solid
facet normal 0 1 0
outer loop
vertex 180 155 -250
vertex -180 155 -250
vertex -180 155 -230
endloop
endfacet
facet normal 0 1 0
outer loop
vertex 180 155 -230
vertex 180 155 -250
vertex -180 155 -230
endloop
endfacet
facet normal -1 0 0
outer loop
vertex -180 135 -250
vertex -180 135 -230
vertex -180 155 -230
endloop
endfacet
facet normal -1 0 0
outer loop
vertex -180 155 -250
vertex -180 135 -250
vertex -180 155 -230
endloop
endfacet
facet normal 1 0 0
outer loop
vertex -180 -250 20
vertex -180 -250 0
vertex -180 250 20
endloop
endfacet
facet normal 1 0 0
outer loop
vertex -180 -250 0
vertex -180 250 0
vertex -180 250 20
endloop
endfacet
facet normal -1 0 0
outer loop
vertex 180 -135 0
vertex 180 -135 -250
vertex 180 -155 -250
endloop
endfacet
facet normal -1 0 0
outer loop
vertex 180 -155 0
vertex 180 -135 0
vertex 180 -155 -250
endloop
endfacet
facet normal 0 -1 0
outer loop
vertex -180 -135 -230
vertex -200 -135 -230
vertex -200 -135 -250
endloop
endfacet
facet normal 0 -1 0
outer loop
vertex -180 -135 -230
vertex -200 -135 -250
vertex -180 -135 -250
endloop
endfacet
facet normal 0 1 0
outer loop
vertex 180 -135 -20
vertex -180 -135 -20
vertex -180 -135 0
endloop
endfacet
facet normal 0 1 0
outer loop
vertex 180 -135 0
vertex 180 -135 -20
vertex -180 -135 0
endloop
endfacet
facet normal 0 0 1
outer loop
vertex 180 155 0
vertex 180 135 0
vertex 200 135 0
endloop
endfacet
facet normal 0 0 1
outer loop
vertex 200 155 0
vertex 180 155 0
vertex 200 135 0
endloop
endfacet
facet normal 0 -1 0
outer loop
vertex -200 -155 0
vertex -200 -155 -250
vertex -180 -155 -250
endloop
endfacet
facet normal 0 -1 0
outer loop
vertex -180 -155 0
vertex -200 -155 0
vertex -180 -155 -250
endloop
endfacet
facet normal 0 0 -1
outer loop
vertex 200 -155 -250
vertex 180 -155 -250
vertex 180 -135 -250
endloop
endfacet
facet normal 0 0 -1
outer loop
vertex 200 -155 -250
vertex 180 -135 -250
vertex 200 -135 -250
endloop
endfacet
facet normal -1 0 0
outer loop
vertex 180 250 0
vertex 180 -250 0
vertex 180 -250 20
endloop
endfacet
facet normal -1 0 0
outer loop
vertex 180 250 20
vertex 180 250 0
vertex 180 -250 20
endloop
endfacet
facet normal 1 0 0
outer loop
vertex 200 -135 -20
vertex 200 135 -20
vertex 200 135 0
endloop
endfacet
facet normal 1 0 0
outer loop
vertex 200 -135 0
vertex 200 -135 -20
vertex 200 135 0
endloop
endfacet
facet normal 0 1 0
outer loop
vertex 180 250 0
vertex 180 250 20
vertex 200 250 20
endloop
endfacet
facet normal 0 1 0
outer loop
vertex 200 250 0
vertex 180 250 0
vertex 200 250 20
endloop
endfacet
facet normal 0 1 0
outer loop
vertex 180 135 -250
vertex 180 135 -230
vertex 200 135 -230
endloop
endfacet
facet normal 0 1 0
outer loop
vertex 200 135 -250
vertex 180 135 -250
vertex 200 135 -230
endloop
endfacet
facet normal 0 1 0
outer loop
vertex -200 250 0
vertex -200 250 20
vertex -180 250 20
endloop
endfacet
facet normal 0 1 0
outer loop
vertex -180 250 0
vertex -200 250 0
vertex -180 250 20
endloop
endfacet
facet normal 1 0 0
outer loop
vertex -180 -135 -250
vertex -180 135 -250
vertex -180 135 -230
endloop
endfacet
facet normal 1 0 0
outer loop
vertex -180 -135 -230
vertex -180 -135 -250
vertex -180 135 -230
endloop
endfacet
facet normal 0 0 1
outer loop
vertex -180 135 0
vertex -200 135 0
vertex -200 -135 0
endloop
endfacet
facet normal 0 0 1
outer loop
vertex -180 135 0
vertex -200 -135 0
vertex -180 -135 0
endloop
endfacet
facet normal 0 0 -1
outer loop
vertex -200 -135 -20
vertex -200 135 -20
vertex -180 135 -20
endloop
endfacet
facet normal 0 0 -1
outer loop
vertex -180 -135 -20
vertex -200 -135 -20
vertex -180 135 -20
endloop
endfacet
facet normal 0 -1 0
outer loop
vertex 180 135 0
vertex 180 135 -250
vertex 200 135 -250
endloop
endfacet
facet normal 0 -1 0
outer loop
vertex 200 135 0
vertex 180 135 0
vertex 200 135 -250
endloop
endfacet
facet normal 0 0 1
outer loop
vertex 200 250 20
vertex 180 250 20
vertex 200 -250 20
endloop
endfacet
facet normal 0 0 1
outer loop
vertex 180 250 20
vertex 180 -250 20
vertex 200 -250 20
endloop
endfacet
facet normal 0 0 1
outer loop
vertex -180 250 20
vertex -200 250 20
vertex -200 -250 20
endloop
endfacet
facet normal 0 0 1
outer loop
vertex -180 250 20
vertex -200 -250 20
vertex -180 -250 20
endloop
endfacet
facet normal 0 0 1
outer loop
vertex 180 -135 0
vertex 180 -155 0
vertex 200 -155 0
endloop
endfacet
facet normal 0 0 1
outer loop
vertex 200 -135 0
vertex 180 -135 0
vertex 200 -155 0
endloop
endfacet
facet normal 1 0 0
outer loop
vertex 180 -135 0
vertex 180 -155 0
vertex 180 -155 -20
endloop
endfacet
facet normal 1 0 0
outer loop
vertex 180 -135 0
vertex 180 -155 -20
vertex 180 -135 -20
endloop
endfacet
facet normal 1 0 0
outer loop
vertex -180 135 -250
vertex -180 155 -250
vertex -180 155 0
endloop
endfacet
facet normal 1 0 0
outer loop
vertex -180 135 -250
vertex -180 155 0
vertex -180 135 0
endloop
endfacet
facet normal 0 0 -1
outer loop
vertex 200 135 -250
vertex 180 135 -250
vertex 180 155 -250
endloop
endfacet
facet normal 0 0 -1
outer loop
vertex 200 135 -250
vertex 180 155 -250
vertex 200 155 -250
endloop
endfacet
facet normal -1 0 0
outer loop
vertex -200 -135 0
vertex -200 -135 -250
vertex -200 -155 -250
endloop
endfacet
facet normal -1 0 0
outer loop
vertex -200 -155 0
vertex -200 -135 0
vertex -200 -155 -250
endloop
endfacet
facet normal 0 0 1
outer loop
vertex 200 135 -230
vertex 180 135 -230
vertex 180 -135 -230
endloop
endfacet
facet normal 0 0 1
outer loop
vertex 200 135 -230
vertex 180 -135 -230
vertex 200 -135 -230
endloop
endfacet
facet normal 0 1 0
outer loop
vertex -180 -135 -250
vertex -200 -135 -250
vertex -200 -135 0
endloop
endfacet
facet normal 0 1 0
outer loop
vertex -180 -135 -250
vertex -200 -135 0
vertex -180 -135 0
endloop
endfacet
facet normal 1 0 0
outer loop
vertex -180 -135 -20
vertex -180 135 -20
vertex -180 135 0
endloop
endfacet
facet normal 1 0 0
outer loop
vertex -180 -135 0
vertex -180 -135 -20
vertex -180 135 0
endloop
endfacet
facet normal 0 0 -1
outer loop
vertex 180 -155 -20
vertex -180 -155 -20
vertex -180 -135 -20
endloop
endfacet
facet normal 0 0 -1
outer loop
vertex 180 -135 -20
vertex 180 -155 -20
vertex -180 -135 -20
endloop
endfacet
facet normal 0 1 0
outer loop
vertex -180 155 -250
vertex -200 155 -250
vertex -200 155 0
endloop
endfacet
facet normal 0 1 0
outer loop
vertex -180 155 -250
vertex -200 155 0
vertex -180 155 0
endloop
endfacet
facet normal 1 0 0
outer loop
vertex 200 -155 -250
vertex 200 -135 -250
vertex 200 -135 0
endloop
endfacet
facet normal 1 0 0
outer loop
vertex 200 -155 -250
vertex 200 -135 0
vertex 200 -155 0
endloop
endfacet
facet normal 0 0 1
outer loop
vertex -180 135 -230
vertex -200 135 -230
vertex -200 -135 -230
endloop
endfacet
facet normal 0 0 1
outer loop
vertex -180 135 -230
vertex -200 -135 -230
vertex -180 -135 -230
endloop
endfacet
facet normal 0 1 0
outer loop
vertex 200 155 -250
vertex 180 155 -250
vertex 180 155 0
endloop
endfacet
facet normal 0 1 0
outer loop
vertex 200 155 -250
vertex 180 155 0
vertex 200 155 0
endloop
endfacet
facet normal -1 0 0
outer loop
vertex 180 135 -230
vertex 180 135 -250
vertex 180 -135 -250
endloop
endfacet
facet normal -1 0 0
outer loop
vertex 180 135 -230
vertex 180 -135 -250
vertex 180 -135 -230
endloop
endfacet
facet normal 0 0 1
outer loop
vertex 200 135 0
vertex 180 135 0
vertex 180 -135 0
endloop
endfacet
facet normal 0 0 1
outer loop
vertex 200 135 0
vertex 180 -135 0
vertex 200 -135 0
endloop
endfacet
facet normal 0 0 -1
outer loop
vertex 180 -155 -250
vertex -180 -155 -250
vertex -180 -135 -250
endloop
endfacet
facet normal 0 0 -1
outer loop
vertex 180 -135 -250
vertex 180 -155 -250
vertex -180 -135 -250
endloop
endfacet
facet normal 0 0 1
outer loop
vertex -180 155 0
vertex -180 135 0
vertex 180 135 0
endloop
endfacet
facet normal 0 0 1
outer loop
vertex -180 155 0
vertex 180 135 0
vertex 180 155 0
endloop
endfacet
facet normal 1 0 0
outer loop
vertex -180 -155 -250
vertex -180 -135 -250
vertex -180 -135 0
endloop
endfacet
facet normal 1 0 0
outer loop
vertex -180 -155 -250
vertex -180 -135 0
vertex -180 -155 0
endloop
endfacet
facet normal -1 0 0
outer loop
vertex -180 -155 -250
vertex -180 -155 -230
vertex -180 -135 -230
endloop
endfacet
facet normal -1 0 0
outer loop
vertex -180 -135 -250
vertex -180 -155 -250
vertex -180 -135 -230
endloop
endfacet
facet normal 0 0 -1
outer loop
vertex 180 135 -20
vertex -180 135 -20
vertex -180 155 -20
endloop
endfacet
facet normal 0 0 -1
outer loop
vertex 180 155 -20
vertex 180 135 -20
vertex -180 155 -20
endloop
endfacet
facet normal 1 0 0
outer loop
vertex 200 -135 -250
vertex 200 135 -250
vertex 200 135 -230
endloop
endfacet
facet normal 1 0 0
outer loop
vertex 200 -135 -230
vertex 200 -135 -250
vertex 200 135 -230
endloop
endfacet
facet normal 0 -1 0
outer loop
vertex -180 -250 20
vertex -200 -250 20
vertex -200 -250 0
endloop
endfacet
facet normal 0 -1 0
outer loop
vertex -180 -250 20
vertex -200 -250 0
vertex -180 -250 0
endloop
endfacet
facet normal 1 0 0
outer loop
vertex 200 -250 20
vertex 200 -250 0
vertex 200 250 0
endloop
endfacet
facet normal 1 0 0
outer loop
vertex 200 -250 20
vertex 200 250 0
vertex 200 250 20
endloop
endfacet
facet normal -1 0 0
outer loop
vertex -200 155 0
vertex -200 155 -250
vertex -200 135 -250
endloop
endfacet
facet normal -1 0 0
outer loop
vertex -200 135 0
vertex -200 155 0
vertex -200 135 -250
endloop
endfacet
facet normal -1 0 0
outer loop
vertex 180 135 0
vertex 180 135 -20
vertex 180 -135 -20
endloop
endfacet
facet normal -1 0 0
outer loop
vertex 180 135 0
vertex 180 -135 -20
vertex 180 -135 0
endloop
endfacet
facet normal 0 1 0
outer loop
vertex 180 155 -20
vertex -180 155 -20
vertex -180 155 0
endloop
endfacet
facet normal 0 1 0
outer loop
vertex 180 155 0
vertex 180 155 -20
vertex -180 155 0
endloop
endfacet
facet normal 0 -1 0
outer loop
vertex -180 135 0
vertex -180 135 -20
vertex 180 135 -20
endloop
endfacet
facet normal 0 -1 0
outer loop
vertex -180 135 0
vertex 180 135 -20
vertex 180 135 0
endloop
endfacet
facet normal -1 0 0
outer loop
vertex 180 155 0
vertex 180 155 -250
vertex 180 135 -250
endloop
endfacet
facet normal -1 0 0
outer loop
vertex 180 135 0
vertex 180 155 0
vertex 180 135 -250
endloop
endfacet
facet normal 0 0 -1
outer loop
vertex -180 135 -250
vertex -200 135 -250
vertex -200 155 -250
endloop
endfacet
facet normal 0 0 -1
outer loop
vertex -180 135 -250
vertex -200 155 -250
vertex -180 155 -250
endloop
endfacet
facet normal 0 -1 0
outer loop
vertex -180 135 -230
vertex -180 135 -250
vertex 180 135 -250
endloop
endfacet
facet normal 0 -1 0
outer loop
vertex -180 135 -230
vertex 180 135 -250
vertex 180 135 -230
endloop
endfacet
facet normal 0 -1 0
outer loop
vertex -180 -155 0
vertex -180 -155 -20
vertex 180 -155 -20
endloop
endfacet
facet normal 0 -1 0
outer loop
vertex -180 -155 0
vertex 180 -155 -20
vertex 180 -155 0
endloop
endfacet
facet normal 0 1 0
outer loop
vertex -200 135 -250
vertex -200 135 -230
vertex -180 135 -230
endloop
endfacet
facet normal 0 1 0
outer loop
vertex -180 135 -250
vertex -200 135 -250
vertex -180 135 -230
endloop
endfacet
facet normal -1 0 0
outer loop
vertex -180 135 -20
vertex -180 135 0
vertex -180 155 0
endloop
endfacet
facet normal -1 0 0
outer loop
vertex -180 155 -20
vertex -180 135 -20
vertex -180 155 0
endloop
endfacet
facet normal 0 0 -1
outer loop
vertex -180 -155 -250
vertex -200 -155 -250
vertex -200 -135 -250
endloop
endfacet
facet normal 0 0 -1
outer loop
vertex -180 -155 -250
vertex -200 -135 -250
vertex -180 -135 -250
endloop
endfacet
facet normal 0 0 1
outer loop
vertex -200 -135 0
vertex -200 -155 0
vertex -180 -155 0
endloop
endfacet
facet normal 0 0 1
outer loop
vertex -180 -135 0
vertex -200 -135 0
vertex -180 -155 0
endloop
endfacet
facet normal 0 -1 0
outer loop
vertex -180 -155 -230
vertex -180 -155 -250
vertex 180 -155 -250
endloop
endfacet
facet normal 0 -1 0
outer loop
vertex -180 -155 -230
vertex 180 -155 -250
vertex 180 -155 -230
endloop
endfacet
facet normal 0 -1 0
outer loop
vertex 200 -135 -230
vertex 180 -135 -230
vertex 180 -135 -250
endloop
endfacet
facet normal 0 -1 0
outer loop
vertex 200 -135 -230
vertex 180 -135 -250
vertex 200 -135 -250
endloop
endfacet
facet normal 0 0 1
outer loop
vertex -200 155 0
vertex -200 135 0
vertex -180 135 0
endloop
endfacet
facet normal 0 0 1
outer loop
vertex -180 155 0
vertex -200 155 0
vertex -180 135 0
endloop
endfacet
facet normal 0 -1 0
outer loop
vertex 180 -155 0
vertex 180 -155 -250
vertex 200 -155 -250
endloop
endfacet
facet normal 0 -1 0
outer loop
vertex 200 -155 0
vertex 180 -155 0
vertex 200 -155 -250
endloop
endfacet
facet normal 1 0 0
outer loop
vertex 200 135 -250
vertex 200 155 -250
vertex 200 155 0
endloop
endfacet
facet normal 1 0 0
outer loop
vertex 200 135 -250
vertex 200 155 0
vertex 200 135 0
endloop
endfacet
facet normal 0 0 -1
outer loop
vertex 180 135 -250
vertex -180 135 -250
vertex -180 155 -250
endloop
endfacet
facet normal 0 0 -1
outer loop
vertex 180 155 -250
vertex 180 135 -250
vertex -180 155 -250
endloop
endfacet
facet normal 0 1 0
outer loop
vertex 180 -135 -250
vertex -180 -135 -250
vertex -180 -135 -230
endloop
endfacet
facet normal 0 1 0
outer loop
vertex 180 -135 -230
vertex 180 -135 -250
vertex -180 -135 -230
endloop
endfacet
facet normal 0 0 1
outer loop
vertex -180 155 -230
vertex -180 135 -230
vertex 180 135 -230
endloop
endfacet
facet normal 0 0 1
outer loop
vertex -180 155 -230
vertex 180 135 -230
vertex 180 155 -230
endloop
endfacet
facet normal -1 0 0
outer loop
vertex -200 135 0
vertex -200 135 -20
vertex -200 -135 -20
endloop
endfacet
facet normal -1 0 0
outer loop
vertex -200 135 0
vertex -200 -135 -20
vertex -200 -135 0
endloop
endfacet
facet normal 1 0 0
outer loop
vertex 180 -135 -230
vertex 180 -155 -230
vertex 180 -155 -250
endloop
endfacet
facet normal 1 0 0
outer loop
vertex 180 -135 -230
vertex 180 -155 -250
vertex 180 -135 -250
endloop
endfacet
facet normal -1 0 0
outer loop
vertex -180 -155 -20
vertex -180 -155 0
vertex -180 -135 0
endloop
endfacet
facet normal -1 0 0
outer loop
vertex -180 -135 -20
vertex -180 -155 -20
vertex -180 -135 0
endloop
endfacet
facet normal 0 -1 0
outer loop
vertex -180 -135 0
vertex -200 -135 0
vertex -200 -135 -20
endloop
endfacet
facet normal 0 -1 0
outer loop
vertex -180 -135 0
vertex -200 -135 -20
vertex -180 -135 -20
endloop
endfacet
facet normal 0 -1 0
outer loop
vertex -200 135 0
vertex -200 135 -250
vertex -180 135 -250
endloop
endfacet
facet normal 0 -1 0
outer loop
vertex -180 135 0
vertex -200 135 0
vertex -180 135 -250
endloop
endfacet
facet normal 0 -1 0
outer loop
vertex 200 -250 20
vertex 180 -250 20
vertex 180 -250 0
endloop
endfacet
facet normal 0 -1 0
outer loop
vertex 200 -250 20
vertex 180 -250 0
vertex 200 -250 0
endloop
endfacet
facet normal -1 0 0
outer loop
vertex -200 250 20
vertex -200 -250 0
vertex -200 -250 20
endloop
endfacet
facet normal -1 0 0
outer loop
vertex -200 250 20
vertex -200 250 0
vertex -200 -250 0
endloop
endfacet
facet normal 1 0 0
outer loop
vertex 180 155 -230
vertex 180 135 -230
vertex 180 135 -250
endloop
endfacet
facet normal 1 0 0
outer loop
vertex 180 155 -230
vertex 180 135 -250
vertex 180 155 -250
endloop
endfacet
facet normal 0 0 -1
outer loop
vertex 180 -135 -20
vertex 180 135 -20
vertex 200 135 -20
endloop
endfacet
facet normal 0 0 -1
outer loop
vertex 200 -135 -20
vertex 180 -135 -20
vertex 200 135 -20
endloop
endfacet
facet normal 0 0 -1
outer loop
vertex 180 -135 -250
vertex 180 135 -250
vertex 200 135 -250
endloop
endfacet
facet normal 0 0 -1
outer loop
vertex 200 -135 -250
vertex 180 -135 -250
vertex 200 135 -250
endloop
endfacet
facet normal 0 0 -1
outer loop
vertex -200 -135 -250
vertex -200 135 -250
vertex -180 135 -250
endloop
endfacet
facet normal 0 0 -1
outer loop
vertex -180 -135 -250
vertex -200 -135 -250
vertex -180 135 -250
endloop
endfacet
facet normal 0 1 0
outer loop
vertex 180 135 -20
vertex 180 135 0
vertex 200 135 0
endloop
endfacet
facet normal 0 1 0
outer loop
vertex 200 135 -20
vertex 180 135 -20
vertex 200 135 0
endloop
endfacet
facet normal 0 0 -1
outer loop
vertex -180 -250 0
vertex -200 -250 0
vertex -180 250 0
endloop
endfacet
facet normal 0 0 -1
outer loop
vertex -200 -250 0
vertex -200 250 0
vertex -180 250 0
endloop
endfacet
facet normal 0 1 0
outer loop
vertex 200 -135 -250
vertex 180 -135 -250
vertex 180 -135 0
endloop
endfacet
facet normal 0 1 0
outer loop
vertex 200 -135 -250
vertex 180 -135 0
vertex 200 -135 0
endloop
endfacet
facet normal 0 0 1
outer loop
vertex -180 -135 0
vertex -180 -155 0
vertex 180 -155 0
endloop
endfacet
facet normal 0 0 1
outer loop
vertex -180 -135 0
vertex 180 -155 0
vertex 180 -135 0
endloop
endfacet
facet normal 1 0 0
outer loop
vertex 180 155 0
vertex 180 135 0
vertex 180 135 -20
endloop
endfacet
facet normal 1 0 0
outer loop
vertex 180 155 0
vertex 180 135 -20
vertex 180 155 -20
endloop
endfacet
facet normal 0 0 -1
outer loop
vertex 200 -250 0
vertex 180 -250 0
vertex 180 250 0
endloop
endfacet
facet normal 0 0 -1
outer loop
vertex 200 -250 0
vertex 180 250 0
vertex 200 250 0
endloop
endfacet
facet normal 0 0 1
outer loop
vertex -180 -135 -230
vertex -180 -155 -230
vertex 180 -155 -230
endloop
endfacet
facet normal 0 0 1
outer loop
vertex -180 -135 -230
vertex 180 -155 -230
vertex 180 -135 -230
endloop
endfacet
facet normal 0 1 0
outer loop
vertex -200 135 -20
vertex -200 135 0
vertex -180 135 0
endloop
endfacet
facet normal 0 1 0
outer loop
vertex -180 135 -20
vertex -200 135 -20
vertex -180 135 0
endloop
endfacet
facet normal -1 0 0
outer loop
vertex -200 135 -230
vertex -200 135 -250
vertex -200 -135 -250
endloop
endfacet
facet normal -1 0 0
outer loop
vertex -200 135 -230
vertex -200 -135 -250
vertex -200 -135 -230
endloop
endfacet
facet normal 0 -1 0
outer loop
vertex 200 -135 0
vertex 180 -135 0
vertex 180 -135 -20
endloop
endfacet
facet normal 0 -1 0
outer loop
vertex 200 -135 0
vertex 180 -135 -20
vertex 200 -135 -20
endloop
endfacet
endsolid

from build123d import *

# Parameters (mm, degrees)
F0_W     = 20
F0_H     = 20
F1_DEPTH = 250
F2_W     = 20
F2_H     = 20
F3_DEPTH = 250
F4_W     = 20
F4_H     = 20
F5_DEPTH = 270
F6_W     = 20
F6_H     = 20
F7_DEPTH = 360


with BuildPart() as f1:
    # F0 (on Front) → F1 (new body, symmetric)
    with BuildSketch(Plane.XZ):
        with Locations((-190, 10)):
            Rectangle(F0_W, F0_H)
        with Locations((190, 10)):
            Rectangle(F0_W, F0_H)
    extrude(amount=F1_DEPTH, both=True)


with BuildPart() as f3:
    # F2 (on face) → F3 (new body)
    with BuildSketch(Plane(origin=(0, 0, 0), x_dir=(1, 0, 0), z_dir=(0, 0, -1))):
        with Locations((-190, 145)):
            Rectangle(F2_W, F2_H)
        with Locations((190, 145)):
            Rectangle(F2_W, F2_H)
        with Locations((190, -145)):
            Rectangle(F2_W, F2_H)
        with Locations((-190, -145)):
            Rectangle(F2_W, F2_H)
    extrude(amount=F3_DEPTH)


with BuildPart() as f5:
    # F4 (on face) → F5 (new body, through all)
    with BuildSketch(Plane.XZ.offset(-135)):
        with Locations((-190, -10)):
            Rectangle(F4_W, F4_H)
        with Locations((-190, -240)):
            Rectangle(F4_W, F4_H)
        with Locations((190, -10)):
            Rectangle(F4_W, F4_H)
        with Locations((190, -240)):
            Rectangle(F4_W, F4_H)
    extrude(amount=F5_DEPTH)


with BuildPart() as f7:
    # F6 (on face) → F7 (new body, through all)
    with BuildSketch(Plane.YZ.offset(-180)):
        with Locations((145, -10)):
            Rectangle(F6_W, F6_H)
        with Locations((145, -240)):
            Rectangle(F6_W, F6_H)
        with Locations((-145, -240)):
            Rectangle(F6_W, F6_H)
        with Locations((-145, -10)):
            Rectangle(F6_W, F6_H)
    extrude(amount=F7_DEPTH)


solid = Compound([f1.part, f3.part, f5.part, f7.part])
